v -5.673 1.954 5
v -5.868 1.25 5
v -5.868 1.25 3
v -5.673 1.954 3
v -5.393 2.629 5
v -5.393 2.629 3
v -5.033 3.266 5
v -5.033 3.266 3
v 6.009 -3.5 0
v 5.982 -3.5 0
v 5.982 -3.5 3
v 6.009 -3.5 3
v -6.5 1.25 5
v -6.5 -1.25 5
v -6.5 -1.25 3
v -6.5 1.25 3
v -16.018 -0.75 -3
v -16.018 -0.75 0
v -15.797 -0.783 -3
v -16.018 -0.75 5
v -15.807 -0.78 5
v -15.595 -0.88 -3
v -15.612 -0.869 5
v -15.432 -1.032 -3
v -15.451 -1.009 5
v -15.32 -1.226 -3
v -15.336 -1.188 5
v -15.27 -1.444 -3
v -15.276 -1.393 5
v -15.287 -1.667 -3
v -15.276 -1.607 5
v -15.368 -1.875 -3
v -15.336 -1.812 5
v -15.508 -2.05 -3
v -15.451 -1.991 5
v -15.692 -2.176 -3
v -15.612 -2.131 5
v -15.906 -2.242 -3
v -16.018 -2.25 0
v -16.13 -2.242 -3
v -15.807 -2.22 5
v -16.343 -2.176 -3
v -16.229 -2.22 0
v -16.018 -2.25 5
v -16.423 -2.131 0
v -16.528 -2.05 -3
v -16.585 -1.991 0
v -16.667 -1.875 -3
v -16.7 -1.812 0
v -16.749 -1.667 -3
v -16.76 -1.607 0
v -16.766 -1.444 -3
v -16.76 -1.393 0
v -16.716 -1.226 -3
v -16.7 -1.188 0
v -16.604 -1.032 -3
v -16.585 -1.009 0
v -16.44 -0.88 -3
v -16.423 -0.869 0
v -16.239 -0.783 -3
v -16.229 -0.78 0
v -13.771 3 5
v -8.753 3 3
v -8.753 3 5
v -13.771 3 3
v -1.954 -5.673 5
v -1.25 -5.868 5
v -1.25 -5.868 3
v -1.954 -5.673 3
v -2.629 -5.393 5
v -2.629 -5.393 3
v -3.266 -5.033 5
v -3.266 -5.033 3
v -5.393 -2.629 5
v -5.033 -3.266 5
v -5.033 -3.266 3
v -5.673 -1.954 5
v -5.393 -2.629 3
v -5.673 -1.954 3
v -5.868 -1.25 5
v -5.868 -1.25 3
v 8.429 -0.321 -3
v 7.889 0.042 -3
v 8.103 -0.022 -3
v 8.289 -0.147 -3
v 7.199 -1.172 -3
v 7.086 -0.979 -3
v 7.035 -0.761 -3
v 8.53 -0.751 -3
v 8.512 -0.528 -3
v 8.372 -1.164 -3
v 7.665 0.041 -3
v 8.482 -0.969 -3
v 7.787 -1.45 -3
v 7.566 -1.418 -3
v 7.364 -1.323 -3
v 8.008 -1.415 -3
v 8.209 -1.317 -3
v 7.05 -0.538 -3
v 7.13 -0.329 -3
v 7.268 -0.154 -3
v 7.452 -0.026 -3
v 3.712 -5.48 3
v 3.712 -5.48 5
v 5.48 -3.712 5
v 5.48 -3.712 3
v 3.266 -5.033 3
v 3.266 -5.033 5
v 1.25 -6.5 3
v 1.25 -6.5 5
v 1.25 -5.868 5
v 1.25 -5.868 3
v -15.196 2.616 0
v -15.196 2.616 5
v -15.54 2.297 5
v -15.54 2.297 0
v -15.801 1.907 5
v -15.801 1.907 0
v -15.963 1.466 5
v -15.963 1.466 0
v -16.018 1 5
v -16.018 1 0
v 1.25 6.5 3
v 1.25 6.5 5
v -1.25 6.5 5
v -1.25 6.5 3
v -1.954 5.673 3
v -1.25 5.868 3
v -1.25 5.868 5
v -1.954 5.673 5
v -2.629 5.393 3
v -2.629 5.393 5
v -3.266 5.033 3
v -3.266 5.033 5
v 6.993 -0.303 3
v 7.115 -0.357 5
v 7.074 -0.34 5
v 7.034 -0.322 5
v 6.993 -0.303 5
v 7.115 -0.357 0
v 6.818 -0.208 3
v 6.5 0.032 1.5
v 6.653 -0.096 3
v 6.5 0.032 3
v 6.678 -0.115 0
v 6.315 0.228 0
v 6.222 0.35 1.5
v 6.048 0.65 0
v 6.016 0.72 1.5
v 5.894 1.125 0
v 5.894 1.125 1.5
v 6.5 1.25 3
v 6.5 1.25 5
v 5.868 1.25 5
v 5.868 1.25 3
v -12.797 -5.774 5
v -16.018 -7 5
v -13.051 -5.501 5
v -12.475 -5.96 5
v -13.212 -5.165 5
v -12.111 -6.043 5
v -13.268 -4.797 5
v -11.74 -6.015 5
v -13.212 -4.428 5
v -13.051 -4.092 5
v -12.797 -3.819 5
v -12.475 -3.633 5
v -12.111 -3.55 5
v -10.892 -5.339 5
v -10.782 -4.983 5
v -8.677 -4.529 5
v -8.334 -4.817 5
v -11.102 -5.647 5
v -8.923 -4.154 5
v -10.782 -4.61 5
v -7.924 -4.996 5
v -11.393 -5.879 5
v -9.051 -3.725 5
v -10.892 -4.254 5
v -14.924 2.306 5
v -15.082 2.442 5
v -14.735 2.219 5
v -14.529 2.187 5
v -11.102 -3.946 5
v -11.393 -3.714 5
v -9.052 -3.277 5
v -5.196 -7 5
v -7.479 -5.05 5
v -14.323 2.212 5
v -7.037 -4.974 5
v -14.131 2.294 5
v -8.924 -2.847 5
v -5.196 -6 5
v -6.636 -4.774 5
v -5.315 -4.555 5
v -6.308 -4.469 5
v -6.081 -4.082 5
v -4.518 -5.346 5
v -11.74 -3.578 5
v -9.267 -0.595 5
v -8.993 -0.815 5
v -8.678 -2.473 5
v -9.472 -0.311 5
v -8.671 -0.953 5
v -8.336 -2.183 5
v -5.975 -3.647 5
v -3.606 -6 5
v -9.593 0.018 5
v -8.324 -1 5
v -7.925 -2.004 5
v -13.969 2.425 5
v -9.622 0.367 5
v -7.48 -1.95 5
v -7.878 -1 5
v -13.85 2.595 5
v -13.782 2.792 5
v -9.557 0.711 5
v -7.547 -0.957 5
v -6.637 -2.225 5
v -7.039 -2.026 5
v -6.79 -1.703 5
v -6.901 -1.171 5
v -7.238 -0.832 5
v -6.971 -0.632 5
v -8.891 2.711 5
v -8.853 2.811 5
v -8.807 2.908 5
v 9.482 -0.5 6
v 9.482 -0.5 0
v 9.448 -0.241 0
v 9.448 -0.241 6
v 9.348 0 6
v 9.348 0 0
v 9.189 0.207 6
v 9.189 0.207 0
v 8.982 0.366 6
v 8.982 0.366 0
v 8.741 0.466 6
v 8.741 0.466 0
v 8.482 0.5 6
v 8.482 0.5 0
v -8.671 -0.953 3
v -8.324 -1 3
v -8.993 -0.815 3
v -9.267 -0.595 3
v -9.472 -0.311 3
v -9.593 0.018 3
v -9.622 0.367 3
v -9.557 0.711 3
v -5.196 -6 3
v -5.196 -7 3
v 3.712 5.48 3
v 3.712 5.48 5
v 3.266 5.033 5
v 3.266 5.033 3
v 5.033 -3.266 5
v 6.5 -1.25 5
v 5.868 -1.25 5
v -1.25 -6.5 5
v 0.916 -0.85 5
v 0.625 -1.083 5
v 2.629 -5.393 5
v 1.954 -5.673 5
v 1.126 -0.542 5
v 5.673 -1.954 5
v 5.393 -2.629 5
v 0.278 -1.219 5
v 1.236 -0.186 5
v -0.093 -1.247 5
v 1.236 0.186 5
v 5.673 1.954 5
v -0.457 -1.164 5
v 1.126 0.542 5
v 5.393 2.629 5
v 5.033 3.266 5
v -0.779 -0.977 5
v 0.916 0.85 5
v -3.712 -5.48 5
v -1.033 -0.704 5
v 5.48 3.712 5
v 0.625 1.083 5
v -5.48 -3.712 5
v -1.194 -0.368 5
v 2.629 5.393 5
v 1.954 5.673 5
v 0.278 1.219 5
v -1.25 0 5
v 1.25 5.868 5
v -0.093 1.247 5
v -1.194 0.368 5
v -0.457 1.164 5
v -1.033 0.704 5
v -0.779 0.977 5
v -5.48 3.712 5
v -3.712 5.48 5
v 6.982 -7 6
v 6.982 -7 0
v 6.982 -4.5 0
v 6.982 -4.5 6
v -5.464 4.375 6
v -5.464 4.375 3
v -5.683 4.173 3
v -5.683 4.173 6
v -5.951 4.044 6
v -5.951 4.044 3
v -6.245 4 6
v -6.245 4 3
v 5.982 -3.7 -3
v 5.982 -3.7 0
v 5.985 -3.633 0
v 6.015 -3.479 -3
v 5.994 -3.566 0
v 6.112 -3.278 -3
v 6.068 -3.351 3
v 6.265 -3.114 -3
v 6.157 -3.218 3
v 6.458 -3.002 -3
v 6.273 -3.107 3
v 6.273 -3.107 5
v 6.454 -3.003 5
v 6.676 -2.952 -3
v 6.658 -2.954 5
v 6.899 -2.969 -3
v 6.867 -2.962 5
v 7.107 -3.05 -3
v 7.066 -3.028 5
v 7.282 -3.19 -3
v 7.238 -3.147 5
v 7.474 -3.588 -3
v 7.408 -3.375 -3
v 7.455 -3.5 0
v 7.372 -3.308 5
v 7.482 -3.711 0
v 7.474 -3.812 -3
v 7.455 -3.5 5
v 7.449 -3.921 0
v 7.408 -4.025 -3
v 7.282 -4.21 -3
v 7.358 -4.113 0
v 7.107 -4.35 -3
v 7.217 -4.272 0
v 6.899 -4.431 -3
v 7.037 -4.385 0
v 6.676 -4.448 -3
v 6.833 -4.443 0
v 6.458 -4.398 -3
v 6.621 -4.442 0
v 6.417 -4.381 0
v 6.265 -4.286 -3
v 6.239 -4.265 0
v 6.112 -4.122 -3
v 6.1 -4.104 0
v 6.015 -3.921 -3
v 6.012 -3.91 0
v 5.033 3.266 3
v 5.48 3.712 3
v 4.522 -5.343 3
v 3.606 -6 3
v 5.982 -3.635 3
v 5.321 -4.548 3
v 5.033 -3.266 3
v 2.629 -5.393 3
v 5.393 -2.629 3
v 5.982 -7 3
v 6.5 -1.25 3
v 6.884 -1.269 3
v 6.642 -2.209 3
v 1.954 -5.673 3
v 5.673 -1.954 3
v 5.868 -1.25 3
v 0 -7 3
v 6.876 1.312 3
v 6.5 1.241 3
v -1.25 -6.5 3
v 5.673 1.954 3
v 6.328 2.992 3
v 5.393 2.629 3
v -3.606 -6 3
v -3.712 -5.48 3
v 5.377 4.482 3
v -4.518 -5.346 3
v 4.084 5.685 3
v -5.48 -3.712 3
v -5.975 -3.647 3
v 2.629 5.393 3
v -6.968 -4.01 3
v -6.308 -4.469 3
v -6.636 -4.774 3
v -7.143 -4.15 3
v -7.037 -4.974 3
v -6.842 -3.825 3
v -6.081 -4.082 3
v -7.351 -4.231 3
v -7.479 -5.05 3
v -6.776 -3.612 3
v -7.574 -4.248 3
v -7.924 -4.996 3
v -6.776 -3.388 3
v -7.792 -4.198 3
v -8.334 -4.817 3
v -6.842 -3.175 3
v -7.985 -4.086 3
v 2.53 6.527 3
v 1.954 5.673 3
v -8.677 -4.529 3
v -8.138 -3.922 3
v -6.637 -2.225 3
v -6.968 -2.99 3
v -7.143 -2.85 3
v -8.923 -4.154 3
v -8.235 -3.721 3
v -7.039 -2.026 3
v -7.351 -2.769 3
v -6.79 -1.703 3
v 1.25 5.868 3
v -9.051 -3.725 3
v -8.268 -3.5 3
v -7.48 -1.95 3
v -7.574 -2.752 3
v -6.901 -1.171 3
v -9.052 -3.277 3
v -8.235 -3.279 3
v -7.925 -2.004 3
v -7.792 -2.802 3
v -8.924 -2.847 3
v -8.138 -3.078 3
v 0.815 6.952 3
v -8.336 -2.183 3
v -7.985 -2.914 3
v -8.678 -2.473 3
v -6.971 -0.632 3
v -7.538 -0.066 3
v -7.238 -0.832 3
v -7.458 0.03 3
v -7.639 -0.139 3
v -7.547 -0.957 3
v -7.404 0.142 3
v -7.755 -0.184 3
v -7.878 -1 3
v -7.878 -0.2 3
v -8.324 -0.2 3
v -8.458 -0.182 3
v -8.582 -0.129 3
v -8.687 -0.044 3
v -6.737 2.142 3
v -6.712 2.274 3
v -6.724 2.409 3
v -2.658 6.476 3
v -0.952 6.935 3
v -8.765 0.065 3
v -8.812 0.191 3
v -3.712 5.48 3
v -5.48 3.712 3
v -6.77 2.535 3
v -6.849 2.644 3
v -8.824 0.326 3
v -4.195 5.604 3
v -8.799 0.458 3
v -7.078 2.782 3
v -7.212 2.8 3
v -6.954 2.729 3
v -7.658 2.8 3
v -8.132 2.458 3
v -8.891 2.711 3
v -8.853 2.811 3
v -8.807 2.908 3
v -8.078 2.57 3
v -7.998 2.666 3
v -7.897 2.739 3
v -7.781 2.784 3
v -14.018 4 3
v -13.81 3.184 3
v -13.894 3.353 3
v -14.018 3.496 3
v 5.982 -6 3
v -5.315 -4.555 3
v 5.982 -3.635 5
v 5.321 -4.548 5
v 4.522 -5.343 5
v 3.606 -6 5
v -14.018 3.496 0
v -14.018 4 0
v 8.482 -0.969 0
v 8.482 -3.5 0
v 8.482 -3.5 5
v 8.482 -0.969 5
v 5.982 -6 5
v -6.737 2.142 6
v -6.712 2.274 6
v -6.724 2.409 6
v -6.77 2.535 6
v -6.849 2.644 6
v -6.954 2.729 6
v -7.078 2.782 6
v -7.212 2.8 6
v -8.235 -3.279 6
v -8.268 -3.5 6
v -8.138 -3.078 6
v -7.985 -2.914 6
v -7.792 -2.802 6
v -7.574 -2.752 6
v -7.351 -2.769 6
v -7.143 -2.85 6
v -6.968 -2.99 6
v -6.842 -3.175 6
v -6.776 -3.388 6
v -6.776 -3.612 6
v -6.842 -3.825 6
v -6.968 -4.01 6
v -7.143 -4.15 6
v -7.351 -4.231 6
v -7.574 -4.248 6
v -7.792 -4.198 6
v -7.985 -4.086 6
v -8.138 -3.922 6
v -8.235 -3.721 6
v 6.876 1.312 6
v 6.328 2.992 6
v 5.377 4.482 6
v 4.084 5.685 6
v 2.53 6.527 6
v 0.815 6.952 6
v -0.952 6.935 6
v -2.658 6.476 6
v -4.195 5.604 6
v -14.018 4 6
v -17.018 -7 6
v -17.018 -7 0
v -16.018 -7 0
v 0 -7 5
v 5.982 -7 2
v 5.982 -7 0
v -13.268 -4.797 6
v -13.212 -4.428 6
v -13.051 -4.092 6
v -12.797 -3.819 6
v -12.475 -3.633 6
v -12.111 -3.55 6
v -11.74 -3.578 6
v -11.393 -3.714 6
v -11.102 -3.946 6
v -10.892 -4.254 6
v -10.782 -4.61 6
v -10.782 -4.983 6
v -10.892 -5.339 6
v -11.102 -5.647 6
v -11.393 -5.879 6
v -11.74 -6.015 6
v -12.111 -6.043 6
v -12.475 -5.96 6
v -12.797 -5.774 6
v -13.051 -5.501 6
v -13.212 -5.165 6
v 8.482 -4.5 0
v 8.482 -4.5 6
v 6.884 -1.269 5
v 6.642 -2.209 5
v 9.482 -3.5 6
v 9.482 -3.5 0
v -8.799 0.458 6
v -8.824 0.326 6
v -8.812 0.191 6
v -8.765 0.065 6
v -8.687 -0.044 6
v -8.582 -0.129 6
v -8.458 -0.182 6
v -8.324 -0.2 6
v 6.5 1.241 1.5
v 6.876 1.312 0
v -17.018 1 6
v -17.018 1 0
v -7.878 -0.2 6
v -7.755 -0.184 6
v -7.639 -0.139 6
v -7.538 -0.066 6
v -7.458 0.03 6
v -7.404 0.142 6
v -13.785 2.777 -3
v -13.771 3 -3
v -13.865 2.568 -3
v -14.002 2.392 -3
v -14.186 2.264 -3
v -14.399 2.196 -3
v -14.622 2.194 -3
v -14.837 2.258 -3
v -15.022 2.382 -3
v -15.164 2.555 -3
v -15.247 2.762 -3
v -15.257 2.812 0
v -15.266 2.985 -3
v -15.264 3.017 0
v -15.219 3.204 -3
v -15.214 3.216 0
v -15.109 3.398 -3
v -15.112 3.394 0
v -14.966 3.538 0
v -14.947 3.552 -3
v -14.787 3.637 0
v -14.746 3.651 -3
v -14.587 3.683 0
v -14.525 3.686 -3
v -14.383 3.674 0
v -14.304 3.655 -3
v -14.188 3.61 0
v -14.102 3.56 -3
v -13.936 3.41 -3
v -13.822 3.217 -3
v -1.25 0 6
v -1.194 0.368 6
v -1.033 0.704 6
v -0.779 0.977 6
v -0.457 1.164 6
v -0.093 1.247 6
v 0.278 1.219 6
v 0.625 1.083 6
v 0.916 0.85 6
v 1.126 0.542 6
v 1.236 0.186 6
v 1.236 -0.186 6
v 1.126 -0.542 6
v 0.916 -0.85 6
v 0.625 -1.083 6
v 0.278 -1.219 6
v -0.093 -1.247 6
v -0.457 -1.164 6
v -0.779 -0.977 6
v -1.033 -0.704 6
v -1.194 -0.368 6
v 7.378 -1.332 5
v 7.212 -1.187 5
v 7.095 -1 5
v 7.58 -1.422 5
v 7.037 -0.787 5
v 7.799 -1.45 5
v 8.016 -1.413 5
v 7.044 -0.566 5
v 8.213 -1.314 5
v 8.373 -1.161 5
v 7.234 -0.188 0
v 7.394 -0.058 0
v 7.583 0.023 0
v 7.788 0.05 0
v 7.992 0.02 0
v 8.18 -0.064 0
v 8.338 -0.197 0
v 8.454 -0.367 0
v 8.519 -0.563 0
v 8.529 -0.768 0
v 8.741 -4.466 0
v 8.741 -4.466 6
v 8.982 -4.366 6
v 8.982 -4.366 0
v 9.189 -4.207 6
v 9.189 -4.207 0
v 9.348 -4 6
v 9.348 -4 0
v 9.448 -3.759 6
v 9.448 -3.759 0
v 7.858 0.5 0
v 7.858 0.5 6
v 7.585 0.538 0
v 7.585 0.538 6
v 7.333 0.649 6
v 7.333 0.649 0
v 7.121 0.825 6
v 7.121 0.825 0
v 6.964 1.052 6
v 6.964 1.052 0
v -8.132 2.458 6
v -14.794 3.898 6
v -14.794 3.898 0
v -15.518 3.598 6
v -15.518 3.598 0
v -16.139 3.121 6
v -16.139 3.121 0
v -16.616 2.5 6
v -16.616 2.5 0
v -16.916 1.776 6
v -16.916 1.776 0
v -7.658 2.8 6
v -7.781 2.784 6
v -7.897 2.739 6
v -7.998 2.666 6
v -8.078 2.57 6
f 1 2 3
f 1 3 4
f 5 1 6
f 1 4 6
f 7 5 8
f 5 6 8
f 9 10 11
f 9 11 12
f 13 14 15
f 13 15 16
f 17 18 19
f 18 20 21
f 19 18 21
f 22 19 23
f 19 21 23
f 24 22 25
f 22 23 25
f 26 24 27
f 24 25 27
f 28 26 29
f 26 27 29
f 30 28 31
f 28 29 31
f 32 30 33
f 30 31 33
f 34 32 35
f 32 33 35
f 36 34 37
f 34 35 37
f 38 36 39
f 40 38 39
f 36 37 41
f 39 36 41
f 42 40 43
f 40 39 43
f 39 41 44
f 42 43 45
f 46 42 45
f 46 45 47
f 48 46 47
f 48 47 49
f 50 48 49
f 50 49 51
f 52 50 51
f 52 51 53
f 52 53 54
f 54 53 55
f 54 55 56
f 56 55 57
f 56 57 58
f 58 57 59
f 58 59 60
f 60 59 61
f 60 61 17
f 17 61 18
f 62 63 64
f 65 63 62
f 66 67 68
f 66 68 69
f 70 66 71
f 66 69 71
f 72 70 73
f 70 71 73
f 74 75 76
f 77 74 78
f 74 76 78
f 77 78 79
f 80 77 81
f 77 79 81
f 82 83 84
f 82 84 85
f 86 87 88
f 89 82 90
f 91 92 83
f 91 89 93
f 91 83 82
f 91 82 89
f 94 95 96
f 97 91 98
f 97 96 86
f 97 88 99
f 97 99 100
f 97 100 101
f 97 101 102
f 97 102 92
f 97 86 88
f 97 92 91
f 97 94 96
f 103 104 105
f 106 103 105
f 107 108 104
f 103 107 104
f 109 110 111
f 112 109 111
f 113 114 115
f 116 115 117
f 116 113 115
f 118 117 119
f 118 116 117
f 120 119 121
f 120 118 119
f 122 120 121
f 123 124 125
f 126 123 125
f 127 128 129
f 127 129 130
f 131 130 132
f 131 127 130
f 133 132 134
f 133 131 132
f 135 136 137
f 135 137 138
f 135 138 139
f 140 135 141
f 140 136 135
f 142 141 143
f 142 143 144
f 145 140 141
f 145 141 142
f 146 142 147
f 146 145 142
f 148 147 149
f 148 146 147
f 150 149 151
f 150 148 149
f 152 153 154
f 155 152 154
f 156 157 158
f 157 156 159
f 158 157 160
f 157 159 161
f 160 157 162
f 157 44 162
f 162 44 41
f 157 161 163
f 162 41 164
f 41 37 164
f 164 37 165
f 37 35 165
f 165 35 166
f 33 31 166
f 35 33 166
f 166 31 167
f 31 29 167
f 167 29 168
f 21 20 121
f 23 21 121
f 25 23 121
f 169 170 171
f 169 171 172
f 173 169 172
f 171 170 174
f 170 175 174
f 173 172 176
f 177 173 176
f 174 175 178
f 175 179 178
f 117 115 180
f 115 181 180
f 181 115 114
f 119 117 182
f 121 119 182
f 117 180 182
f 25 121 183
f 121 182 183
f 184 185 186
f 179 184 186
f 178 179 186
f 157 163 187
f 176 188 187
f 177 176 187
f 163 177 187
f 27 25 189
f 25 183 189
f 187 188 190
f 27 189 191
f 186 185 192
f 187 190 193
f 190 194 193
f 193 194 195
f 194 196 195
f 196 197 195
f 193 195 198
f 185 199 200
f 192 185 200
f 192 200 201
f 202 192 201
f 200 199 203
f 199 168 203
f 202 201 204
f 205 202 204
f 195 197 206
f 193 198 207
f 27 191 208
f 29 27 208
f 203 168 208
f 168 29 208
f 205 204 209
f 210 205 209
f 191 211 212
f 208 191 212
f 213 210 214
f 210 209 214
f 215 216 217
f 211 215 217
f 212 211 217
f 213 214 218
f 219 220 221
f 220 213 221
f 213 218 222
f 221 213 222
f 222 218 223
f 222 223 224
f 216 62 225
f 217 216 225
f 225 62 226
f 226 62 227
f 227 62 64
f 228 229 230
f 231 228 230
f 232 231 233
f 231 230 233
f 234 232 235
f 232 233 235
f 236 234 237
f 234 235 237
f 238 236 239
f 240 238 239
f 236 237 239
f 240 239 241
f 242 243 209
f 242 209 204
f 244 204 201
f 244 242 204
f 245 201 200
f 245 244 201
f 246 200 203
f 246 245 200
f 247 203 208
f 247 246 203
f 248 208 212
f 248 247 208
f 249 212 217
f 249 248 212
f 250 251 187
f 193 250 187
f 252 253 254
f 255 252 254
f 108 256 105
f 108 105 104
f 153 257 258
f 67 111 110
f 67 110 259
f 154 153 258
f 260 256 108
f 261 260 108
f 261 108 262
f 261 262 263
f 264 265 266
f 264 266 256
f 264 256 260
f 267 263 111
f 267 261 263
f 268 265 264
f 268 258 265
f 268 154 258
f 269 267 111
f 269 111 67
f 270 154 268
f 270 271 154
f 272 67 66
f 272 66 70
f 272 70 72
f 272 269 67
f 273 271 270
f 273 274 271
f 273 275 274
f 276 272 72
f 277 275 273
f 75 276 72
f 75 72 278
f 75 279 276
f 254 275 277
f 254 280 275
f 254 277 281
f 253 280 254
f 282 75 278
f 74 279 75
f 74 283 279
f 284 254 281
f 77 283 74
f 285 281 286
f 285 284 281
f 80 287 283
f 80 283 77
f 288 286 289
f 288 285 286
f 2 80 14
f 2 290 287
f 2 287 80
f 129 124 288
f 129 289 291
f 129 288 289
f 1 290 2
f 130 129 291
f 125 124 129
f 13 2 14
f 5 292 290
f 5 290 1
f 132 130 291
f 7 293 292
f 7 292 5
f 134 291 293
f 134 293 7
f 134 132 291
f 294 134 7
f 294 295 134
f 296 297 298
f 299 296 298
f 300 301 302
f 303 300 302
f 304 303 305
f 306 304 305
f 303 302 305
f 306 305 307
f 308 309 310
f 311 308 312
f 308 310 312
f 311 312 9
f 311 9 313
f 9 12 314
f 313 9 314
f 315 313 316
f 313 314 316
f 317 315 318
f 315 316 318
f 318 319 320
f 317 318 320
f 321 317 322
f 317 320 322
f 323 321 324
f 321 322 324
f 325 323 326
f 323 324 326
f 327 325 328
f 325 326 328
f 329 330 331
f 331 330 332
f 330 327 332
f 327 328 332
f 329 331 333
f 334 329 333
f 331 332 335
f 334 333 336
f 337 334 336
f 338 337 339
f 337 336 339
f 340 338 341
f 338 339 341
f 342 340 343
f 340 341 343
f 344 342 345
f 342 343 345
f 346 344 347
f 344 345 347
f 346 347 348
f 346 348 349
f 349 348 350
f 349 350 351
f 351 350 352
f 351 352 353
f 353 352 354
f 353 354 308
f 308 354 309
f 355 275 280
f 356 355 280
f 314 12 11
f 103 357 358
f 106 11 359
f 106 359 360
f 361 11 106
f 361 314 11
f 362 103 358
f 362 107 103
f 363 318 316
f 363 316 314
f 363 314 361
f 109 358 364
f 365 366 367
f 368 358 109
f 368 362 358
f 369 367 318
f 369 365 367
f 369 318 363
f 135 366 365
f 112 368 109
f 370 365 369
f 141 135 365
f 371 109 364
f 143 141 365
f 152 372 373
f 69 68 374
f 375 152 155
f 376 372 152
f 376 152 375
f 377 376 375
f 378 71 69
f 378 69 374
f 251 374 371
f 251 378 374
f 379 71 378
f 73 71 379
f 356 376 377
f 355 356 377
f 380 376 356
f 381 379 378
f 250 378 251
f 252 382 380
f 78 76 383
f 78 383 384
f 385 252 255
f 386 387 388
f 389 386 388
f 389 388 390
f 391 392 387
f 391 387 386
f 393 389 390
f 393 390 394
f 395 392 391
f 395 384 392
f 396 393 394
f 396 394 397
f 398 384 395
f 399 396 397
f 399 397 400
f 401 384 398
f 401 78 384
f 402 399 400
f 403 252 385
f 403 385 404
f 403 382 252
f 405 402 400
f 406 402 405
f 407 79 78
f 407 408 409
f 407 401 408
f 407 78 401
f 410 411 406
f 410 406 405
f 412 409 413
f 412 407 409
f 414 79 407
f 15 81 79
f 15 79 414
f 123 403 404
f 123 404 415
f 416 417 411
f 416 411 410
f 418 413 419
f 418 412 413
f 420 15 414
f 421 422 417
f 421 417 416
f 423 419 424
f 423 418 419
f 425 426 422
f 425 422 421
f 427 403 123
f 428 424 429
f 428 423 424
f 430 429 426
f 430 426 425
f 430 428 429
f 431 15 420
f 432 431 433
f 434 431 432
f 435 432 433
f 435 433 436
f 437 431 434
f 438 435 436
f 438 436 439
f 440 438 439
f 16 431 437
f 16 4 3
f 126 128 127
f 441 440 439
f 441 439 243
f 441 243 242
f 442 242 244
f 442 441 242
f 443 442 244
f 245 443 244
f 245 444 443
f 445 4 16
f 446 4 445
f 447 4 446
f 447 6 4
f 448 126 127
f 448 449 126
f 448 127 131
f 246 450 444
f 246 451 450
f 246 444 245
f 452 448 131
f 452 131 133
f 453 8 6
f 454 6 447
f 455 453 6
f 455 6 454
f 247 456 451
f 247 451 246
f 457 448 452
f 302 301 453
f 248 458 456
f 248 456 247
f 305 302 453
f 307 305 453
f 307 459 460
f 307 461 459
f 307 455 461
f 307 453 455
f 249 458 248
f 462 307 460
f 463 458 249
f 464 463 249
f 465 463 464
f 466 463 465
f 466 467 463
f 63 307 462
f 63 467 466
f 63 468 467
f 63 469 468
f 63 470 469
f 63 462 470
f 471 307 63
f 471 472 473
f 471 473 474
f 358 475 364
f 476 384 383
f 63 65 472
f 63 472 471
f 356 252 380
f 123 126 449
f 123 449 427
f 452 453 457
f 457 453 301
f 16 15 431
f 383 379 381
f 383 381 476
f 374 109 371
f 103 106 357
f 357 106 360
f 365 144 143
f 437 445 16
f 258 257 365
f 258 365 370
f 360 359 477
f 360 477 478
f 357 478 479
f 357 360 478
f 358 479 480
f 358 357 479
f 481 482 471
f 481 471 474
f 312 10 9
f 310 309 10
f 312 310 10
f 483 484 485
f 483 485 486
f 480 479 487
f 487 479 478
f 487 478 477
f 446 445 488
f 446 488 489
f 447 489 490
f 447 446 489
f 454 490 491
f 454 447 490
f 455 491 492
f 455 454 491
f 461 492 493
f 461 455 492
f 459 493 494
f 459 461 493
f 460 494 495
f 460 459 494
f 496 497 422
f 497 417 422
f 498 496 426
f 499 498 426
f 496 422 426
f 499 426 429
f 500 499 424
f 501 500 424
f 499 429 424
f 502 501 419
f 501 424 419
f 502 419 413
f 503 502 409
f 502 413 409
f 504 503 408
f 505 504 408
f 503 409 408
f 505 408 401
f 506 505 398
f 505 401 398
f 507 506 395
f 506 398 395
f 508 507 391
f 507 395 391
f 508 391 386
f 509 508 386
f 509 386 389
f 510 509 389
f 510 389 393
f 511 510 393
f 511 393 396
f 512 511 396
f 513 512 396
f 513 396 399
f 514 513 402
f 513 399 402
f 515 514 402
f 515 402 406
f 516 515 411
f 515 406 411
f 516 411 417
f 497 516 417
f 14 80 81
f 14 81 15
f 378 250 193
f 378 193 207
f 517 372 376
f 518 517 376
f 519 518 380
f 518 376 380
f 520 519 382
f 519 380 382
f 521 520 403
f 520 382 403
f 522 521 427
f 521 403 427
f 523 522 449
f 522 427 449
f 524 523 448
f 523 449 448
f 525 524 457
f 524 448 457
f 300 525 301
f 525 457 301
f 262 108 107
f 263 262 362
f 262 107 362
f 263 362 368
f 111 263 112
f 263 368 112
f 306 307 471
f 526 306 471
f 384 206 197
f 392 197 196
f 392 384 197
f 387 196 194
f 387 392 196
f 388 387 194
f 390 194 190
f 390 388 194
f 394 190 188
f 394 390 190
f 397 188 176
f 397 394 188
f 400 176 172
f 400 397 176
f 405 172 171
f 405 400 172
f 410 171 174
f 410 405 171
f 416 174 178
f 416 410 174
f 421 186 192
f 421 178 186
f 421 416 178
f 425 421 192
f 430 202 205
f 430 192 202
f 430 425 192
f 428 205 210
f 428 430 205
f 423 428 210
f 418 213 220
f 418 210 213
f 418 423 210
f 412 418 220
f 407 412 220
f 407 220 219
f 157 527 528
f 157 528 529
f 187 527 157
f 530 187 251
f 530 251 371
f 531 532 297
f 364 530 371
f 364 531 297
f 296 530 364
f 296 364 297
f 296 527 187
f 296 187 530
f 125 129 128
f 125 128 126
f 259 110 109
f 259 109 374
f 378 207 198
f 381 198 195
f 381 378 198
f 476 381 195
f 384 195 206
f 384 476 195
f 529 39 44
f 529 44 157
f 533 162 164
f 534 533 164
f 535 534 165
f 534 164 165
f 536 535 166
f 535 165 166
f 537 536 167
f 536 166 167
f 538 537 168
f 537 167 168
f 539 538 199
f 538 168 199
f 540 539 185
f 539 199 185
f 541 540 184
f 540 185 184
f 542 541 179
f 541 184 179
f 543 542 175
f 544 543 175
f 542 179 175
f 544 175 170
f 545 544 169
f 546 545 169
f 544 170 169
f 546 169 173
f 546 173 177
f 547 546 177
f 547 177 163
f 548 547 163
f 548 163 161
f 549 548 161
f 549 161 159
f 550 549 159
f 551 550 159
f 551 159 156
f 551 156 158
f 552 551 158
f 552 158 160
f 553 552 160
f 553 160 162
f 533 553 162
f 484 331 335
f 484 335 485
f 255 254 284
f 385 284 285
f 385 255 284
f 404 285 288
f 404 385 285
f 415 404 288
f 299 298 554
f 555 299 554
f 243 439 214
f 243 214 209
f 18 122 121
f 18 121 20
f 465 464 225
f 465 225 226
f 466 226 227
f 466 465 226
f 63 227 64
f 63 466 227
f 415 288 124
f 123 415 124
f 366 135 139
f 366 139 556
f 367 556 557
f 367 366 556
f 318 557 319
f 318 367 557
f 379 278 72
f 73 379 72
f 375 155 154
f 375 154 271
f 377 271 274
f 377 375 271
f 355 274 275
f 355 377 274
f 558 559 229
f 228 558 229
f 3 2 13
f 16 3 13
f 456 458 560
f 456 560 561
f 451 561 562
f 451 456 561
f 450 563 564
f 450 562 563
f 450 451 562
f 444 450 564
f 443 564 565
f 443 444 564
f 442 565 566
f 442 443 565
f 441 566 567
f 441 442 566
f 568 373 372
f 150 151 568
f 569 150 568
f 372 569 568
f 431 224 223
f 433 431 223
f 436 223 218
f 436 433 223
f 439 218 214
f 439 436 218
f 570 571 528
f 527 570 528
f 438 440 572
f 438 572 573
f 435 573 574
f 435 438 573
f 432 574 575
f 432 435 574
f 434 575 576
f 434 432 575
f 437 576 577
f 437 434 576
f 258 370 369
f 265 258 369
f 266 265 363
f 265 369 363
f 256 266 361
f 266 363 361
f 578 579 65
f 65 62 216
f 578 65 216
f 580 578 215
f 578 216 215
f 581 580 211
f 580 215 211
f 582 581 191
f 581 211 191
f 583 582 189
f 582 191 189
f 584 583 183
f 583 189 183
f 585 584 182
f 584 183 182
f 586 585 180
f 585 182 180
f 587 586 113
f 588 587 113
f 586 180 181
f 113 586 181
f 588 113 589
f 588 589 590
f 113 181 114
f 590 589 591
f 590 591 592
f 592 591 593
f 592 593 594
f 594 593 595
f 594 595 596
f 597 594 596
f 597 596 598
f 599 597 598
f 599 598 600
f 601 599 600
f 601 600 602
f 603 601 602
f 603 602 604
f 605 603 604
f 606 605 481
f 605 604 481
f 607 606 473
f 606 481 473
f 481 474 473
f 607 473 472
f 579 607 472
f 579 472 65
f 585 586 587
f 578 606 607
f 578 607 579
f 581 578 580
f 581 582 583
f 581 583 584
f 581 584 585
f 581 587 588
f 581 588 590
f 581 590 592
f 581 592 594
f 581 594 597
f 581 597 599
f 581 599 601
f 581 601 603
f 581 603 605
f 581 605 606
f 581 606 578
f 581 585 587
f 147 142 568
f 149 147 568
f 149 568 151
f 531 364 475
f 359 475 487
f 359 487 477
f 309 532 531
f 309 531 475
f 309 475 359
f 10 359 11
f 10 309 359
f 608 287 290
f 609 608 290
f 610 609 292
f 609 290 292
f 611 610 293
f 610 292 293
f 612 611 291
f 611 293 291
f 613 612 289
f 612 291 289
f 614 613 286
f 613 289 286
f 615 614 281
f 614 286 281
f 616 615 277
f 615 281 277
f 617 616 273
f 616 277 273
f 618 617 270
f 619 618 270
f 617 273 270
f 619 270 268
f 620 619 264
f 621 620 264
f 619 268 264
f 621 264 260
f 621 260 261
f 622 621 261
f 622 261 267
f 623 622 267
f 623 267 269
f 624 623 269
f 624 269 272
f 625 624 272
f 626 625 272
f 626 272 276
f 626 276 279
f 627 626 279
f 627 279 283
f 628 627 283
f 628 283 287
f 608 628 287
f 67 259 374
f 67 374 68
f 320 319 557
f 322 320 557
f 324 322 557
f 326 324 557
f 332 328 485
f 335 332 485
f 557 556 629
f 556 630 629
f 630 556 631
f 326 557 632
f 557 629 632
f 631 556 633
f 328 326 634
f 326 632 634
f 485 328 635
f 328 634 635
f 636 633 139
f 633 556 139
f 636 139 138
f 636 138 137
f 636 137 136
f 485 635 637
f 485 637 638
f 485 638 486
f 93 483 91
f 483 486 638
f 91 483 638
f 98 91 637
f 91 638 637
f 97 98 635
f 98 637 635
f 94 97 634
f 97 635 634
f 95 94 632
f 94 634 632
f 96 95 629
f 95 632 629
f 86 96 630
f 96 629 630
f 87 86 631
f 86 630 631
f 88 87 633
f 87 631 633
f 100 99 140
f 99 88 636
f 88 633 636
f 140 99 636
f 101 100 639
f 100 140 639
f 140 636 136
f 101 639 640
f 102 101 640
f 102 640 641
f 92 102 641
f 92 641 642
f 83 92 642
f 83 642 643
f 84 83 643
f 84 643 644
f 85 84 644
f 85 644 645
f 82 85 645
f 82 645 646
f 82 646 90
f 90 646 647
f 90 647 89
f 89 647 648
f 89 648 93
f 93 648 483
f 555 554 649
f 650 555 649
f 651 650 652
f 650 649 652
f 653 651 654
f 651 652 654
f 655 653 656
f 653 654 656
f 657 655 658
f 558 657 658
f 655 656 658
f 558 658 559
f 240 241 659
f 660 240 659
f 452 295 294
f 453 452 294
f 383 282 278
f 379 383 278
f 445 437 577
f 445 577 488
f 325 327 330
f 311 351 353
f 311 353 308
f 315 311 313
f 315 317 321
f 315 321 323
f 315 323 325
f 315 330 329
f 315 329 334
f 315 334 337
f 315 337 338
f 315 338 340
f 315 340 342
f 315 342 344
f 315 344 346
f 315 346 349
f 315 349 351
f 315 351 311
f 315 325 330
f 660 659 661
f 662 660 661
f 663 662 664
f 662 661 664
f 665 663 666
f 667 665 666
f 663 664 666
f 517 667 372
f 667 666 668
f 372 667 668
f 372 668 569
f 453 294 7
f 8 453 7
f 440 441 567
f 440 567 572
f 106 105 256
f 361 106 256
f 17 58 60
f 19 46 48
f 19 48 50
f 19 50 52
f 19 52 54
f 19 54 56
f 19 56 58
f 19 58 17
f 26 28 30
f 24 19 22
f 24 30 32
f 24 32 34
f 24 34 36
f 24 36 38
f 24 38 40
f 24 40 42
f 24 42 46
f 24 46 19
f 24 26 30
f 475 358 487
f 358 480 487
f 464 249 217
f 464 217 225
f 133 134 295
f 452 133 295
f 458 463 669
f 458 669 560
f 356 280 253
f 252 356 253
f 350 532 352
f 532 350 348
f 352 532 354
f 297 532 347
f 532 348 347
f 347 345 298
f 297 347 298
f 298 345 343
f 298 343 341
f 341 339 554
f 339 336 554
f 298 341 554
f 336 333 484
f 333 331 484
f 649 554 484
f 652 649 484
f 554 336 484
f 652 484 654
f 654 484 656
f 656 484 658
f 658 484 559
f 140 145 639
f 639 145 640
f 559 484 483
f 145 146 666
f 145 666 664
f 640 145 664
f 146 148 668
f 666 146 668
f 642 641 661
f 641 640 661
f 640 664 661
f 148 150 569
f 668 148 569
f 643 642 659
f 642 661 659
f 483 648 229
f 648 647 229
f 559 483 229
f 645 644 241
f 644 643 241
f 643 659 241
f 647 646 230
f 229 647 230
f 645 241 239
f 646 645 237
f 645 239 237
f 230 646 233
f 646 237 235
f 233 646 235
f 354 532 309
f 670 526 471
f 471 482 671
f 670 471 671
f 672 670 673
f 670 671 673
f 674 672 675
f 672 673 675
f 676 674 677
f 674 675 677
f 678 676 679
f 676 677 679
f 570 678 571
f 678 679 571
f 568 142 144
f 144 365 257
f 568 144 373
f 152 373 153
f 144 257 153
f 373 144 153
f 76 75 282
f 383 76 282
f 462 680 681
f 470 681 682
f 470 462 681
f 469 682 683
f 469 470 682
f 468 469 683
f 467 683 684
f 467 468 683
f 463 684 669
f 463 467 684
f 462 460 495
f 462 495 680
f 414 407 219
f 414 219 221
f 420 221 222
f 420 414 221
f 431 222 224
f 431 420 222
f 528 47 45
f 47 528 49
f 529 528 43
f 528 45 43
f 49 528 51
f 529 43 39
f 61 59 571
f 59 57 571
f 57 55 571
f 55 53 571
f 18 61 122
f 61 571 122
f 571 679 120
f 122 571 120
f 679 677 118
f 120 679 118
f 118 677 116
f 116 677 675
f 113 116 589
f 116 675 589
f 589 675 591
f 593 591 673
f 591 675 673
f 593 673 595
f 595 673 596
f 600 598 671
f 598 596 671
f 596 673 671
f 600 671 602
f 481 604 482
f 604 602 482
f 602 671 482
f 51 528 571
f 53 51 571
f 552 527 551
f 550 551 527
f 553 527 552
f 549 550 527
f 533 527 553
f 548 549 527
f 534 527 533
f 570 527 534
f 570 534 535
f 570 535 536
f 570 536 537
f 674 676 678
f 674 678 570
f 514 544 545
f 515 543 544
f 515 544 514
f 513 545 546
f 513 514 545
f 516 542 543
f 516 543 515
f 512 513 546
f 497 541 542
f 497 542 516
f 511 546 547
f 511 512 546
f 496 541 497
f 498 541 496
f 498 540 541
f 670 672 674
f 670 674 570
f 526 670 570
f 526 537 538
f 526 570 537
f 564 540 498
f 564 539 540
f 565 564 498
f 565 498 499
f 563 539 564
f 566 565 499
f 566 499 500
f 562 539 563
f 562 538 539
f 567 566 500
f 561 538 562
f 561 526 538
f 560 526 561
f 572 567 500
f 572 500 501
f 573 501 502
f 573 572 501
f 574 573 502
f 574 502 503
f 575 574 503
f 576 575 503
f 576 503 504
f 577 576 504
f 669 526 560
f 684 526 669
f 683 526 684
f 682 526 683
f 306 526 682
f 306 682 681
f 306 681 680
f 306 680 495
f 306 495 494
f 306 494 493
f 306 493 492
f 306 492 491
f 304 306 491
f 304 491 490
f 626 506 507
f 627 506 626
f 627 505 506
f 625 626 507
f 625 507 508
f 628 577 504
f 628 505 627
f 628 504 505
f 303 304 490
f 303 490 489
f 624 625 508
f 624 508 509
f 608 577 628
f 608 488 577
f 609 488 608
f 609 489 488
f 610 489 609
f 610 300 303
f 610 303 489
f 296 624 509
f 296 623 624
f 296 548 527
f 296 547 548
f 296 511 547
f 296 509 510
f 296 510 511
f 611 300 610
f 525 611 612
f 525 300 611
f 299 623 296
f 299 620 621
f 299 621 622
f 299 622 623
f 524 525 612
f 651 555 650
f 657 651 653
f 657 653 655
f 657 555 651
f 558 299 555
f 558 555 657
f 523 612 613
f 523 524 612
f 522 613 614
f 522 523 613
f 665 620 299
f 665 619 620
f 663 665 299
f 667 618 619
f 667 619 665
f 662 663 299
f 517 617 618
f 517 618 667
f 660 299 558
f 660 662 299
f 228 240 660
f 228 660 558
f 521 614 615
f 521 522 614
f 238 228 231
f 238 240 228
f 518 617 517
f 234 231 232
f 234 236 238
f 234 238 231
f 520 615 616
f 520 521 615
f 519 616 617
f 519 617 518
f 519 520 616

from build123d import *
from build123d.topology import SkipClean

# Parameters (mm, degrees)
BOSS_EXTRUDE1_DEPTH = 6
SHELL1_DEPTH        = 5
SKETCH2_R           = 1.25
SKETCH2_R_2         = 0.75
CUT_EXTRUDE1_DEPTH  = 6
SKETCH3_W           = 11.178272445
SKETCH3_H           = 3
BOSS_EXTRUDE2_DEPTH = 1
CUT_EXTRUDE2_DEPTH  = 3
BOSS_EXTRUDE4_START = 2
SKETCH7_R           = 7
SKETCH7_R_2         = 6
BOSS_EXTRUDE4_DEPTH = 2
BOSS_EXTRUDE5_START = 2
SKETCH8_R           = 1.55
SKETCH8_R_2         = 0.75
BOSS_EXTRUDE5_DEPTH = 2
SKETCH10_R          = 0.75
BOSS_EXTRUDE6_DEPTH = 8
SKETCH17_W          = 11.178272445
SKETCH17_H          = 1
CUT_EXTRUDE5_DEPTH  = 1
SKETCH18_W          = 2.5
SKETCH18_H          = 2
SKETCH18_W_2        = 2
SKETCH18_H_2        = 2.5
CUT_EXTRUDE7_DEPTH  = 3.5


# Read off the part's stored shape, not the designer's step: Shell1
with BuildPart() as part:
    # Sketch1 → Boss-Extrude1 (new body)
    with BuildSketch(Plane.XY):
        with BuildLine():
            Line((-17.017879978, -7), (6.982120022, -7))
            Line((6.982120022, -7), (6.982120022, -4.5))
            Line((6.982120022, -4.5), (8.482120022, -4.5))
            ThreePointArc((8.482120022, -4.5), (9.189226803, -4.207106781), (9.482120022, -3.5))
            Line((9.482120022, -3.5), (9.482120022, -0.5))
            ThreePointArc((9.482120022, -0.5), (9.189226803, 0.207106781), (8.482120022, 0.5))
            Line((8.482120022, 0.5), (7.858116823, 0.5))
            ThreePointArc((7.858116823, 0.5), (7.220739384, 0.72944825), (6.87585222, 1.3125))
            ThreePointArc((6.87585222, 1.3125), (1.68605895, 6.793909421), (-5.464373249, 4.375))
            ThreePointArc((-5.464373249, 4.375), (-5.811985297, 4.098612181), (-6.244997998, 4))
            Line((-6.244997998, 4), (-14.017879978, 4))
            ThreePointArc((-14.017879978, 4), (-16.139200322, 3.121320344), (-17.017879978, 1))
            Line((-17.017879978, 1), (-17.017879978, -7))
        make_face()
    extrude(amount=BOSS_EXTRUDE1_DEPTH)

    # Shell1 outline → Shell1 (cut)
    with BuildSketch(Plane.XY):
        with BuildLine():
            Line((-16.017879978, 1), (-16.017879978, -7))
            Line((-16.017879978, -7), (5.982120022, -7))
            Line((5.982120022, -7), (5.982120022, -3.5))
            Line((5.982120022, -3.5), (8.482120022, -3.5))
            Line((8.482120022, -3.5), (8.482120022, -0.5))
            Line((8.482120022, -0.5), (7.858116823, -0.5))
            ThreePointArc((7.858116823, -0.5), (6.583361944, -0.041103501), (5.893587617, 1.125))
            ThreePointArc((5.893587617, 1.125), (1.445193386, 5.823350932), (-4.683748499, 3.75))
            ThreePointArc((-4.683748499, 3.75), (-5.378972594, 3.197224362), (-6.244997998, 3))
            Line((-6.244997998, 3), (-14.017879978, 3))
            ThreePointArc((-14.017879978, 3), (-15.43209354, 2.414213562), (-16.017879978, 1))
        make_face()
    extrude(amount=SHELL1_DEPTH, mode=Mode.SUBTRACT)

    # Sketch2 → Cut-Extrude1 (cut)
    with BuildSketch(Plane(origin=(0, 0, 5), x_dir=(-1, 0, 0), z_dir=(0, 0, -1))):
        Circle(SKETCH2_R)
        with Locations((7.517879978, -3.5)):
            Circle(SKETCH2_R_2)
        with Locations((12.017879978, -4.796605976)):
            Circle(SKETCH2_R)
        with BuildLine():
            Line((7.211592921, 2.8), (7.657500368, 2.8))
            ThreePointArc((7.657500368, 2.8), (7.94985551, 2.705621093), (8.131842017, 2.458113883))
            Line((8.131842017, 2.458113883), (8.798508684, 0.458113883))
            ThreePointArc((8.798508684, 0.458113883), (8.729788127, 0.007644858), (8.324167035, -0.2))
            Line((8.324167035, -0.2), (7.878259588, -0.2))
            ThreePointArc((7.878259588, -0.2), (7.585904446, -0.105621093), (7.403917939, 0.141886117))
            Line((7.403917939, 0.141886117), (6.737251272, 2.141886117))
            ThreePointArc((6.737251272, 2.141886117), (6.805971829, 2.592355142), (7.211592921, 2.8))
        make_face()
    extrude(amount=-CUT_EXTRUDE1_DEPTH, mode=Mode.SUBTRACT)

    # Sketch3 → Boss-Extrude2 (add)
    with BuildSketch(Plane.XZ.offset(7)):
        with Locations((0.3929838, 3.5)):
            Rectangle(SKETCH3_W, SKETCH3_H)
    extrude(amount=-BOSS_EXTRUDE2_DEPTH)

    # Sketch6 → Cut-Extrude2 (cut)
    with BuildSketch(Plane(origin=(0, 0, 0), x_dir=(-1, 0, 0), z_dir=(0, 0, -1))):
        with BuildLine():
            Line((6.244997998, 4), (14.017879978, 4))
            Line((14.017879978, 4), (14.017879978, 3))
            Line((14.017879978, 3), (6.244997998, 3))
            ThreePointArc((6.244997998, 3), (5.378972595, 3.197224362), (4.683748499, 3.75))
            ThreePointArc((4.683748499, 3.75), (-1.445193386, 5.823350932), (-5.893587617, 1.125))
            Line((-5.893587617, 1.125), (-6.87585222, 1.3125))
            ThreePointArc((-6.87585222, 1.3125), (-1.68605895, 6.793909421), (5.464373249, 4.375))
            ThreePointArc((5.464373249, 4.375), (5.811985297, 4.098612181), (6.244997998, 4))
        make_face()
    extrude(amount=-CUT_EXTRUDE2_DEPTH, mode=Mode.SUBTRACT)

    # Sketch7 → Boss-Extrude4 (add)
    with SkipClean():  # the faces are left unmerged after this step: merging them gives an invalid solid
        with BuildSketch(Plane(origin=(0, 0, 5), x_dir=(-1, 0, 0), z_dir=(0, 0, -1)).offset(BOSS_EXTRUDE4_START)):
            Circle(SKETCH7_R)
            with Locations(Location((0, 0, 0), (0, 0, 270))):
                Circle(SKETCH7_R_2, mode=Mode.SUBTRACT)
        extrude(amount=-BOSS_EXTRUDE4_DEPTH)

    # Sketch8 → Boss-Extrude5 (add)
    # profile 1 of 2: a face of its own
    with SkipClean():  # the faces are left unmerged after this step: merging them gives an invalid solid
        with BuildSketch(Plane(origin=(0, 0, 5), x_dir=(-1, 0, 0), z_dir=(0, 0, -1)).offset(BOSS_EXTRUDE5_START)):
            with Locations((7.517879978, -3.5)):
                Circle(SKETCH8_R)
            with Locations((7.517879978, -3.5)):
                Circle(SKETCH8_R_2, mode=Mode.SUBTRACT)
        # profile 2 of 2: a face of its own
        with BuildSketch(Plane(origin=(0, 0, 5), x_dir=(-1, 0, 0), z_dir=(0, 0, -1)).offset(BOSS_EXTRUDE5_START)):
            with BuildLine():
                Line((5.978304634, 1.888903904), (6.644971301, -0.111096096))
                ThreePointArc((6.644971301, -0.111096096), (7.118136218, -0.754614841), (7.878259588, -1))
                Line((7.878259588, -1), (8.324167035, -1))
                ThreePointArc((8.324167035, -1), (9.378781875, -0.46012337), (9.557455322, 0.711096096))
                Line((9.557455322, 0.711096096), (8.890788656, 2.711096096))
                ThreePointArc((8.890788656, 2.711096096), (8.417623738, 3.354614841), (7.657500368, 3.6))
                Line((7.657500368, 3.6), (7.211592921, 3.6))
                ThreePointArc((7.211592921, 3.6), (6.156978081, 3.06012337), (5.978304634, 1.888903904))
            make_face()
            with BuildLine():
                Line((7.657500368, 2.8), (7.211592921, 2.8))
                ThreePointArc((7.211592921, 2.8), (6.805971829, 2.592355142), (6.737251272, 2.141886117))
                Line((6.737251272, 2.141886117), (7.403917939, 0.141886117))
                ThreePointArc((7.403917939, 0.141886117), (7.585904446, -0.105621093), (7.878259588, -0.2))
                Line((7.878259588, -0.2), (8.324167035, -0.2))
                ThreePointArc((8.324167035, -0.2), (8.729788127, 0.007644858), (8.798508684, 0.458113883))
                Line((8.798508684, 0.458113883), (8.131842017, 2.458113883))
                ThreePointArc((8.131842017, 2.458113883), (7.94985551, 2.705621093), (7.657500368, 2.8))
            make_face(mode=Mode.SUBTRACT)
        extrude(amount=-BOSS_EXTRUDE5_DEPTH)

    # Sketch10 → Boss-Extrude6 (add)
    with SkipClean():  # the faces are left unmerged after this step: merging them gives an invalid solid
        with BuildSketch(Plane(origin=(0, 0, 5), x_dir=(-1, 0, 0), z_dir=(0, 0, -1))):
            with Locations(Location((-7.782120022, -0.7, 0), (0, 0, 201.039469781))):
                Circle(SKETCH10_R)
            with Locations((-6.732120022, -3.7)):
                Circle(SKETCH10_R)
            with Locations(Location((16.017879978, -1.5, 0), (0, 0, 90))):
                Circle(SKETCH10_R)
            with Locations(Location((14.517879978, 2.936491673, 0), (0, 0, 175.1425044))):
                Circle(SKETCH10_R)
        extrude(amount=BOSS_EXTRUDE6_DEPTH)

    # Sketch17 → Cut-Extrude5 (cut)
    with SkipClean():  # the faces are left unmerged after this step: merging them gives an invalid solid
        with BuildSketch(Plane(origin=(0, 0, 2), x_dir=(-1, 0, 0), z_dir=(0, 0, -1))):
            with Locations((-0.3929838, -6.5)):
                Rectangle(SKETCH17_W, SKETCH17_H)
        extrude(amount=-CUT_EXTRUDE5_DEPTH, mode=Mode.SUBTRACT)

    # Sketch18 → Cut-Extrude7 (cut)
    with BuildSketch(Plane(origin=(0, 0, 5), x_dir=(-1, 0, 0), z_dir=(0, 0, -1))):
        Polygon((2.298097039, 4.065863992), (3.712310601, 5.480077554), (5.480077554, 3.712310601), (4.065863992, 2.298097039), align=None)
        with Locations((0, 5.5)):
            Rectangle(SKETCH18_W, SKETCH18_H)
        with Locations((5.5, 0)):
            Rectangle(SKETCH18_W_2, SKETCH18_H_2)
        Polygon((4.065863992, -2.298097039), (5.480077554, -3.712310601), (3.712310601, -5.480077554), (2.298097039, -4.065863992), align=None)
        with Locations((0, -5.5)):
            Rectangle(SKETCH18_W, SKETCH18_H)
        Polygon((-2.298097039, -4.065863992), (-3.712310601, -5.480077554), (-5.480077554, -3.712310601), (-4.065863992, -2.298097039), align=None)
        with Locations((-5.5, 0)):
            Rectangle(SKETCH18_W_2, SKETCH18_H_2)
        Polygon((-4.065863992, 2.298097039), (-5.480077554, 3.712310601), (-3.712310601, 5.480077554), (-2.298097039, 4.065863992), align=None)
    extrude(amount=CUT_EXTRUDE7_DEPTH, mode=Mode.SUBTRACT)


solid = part.part
